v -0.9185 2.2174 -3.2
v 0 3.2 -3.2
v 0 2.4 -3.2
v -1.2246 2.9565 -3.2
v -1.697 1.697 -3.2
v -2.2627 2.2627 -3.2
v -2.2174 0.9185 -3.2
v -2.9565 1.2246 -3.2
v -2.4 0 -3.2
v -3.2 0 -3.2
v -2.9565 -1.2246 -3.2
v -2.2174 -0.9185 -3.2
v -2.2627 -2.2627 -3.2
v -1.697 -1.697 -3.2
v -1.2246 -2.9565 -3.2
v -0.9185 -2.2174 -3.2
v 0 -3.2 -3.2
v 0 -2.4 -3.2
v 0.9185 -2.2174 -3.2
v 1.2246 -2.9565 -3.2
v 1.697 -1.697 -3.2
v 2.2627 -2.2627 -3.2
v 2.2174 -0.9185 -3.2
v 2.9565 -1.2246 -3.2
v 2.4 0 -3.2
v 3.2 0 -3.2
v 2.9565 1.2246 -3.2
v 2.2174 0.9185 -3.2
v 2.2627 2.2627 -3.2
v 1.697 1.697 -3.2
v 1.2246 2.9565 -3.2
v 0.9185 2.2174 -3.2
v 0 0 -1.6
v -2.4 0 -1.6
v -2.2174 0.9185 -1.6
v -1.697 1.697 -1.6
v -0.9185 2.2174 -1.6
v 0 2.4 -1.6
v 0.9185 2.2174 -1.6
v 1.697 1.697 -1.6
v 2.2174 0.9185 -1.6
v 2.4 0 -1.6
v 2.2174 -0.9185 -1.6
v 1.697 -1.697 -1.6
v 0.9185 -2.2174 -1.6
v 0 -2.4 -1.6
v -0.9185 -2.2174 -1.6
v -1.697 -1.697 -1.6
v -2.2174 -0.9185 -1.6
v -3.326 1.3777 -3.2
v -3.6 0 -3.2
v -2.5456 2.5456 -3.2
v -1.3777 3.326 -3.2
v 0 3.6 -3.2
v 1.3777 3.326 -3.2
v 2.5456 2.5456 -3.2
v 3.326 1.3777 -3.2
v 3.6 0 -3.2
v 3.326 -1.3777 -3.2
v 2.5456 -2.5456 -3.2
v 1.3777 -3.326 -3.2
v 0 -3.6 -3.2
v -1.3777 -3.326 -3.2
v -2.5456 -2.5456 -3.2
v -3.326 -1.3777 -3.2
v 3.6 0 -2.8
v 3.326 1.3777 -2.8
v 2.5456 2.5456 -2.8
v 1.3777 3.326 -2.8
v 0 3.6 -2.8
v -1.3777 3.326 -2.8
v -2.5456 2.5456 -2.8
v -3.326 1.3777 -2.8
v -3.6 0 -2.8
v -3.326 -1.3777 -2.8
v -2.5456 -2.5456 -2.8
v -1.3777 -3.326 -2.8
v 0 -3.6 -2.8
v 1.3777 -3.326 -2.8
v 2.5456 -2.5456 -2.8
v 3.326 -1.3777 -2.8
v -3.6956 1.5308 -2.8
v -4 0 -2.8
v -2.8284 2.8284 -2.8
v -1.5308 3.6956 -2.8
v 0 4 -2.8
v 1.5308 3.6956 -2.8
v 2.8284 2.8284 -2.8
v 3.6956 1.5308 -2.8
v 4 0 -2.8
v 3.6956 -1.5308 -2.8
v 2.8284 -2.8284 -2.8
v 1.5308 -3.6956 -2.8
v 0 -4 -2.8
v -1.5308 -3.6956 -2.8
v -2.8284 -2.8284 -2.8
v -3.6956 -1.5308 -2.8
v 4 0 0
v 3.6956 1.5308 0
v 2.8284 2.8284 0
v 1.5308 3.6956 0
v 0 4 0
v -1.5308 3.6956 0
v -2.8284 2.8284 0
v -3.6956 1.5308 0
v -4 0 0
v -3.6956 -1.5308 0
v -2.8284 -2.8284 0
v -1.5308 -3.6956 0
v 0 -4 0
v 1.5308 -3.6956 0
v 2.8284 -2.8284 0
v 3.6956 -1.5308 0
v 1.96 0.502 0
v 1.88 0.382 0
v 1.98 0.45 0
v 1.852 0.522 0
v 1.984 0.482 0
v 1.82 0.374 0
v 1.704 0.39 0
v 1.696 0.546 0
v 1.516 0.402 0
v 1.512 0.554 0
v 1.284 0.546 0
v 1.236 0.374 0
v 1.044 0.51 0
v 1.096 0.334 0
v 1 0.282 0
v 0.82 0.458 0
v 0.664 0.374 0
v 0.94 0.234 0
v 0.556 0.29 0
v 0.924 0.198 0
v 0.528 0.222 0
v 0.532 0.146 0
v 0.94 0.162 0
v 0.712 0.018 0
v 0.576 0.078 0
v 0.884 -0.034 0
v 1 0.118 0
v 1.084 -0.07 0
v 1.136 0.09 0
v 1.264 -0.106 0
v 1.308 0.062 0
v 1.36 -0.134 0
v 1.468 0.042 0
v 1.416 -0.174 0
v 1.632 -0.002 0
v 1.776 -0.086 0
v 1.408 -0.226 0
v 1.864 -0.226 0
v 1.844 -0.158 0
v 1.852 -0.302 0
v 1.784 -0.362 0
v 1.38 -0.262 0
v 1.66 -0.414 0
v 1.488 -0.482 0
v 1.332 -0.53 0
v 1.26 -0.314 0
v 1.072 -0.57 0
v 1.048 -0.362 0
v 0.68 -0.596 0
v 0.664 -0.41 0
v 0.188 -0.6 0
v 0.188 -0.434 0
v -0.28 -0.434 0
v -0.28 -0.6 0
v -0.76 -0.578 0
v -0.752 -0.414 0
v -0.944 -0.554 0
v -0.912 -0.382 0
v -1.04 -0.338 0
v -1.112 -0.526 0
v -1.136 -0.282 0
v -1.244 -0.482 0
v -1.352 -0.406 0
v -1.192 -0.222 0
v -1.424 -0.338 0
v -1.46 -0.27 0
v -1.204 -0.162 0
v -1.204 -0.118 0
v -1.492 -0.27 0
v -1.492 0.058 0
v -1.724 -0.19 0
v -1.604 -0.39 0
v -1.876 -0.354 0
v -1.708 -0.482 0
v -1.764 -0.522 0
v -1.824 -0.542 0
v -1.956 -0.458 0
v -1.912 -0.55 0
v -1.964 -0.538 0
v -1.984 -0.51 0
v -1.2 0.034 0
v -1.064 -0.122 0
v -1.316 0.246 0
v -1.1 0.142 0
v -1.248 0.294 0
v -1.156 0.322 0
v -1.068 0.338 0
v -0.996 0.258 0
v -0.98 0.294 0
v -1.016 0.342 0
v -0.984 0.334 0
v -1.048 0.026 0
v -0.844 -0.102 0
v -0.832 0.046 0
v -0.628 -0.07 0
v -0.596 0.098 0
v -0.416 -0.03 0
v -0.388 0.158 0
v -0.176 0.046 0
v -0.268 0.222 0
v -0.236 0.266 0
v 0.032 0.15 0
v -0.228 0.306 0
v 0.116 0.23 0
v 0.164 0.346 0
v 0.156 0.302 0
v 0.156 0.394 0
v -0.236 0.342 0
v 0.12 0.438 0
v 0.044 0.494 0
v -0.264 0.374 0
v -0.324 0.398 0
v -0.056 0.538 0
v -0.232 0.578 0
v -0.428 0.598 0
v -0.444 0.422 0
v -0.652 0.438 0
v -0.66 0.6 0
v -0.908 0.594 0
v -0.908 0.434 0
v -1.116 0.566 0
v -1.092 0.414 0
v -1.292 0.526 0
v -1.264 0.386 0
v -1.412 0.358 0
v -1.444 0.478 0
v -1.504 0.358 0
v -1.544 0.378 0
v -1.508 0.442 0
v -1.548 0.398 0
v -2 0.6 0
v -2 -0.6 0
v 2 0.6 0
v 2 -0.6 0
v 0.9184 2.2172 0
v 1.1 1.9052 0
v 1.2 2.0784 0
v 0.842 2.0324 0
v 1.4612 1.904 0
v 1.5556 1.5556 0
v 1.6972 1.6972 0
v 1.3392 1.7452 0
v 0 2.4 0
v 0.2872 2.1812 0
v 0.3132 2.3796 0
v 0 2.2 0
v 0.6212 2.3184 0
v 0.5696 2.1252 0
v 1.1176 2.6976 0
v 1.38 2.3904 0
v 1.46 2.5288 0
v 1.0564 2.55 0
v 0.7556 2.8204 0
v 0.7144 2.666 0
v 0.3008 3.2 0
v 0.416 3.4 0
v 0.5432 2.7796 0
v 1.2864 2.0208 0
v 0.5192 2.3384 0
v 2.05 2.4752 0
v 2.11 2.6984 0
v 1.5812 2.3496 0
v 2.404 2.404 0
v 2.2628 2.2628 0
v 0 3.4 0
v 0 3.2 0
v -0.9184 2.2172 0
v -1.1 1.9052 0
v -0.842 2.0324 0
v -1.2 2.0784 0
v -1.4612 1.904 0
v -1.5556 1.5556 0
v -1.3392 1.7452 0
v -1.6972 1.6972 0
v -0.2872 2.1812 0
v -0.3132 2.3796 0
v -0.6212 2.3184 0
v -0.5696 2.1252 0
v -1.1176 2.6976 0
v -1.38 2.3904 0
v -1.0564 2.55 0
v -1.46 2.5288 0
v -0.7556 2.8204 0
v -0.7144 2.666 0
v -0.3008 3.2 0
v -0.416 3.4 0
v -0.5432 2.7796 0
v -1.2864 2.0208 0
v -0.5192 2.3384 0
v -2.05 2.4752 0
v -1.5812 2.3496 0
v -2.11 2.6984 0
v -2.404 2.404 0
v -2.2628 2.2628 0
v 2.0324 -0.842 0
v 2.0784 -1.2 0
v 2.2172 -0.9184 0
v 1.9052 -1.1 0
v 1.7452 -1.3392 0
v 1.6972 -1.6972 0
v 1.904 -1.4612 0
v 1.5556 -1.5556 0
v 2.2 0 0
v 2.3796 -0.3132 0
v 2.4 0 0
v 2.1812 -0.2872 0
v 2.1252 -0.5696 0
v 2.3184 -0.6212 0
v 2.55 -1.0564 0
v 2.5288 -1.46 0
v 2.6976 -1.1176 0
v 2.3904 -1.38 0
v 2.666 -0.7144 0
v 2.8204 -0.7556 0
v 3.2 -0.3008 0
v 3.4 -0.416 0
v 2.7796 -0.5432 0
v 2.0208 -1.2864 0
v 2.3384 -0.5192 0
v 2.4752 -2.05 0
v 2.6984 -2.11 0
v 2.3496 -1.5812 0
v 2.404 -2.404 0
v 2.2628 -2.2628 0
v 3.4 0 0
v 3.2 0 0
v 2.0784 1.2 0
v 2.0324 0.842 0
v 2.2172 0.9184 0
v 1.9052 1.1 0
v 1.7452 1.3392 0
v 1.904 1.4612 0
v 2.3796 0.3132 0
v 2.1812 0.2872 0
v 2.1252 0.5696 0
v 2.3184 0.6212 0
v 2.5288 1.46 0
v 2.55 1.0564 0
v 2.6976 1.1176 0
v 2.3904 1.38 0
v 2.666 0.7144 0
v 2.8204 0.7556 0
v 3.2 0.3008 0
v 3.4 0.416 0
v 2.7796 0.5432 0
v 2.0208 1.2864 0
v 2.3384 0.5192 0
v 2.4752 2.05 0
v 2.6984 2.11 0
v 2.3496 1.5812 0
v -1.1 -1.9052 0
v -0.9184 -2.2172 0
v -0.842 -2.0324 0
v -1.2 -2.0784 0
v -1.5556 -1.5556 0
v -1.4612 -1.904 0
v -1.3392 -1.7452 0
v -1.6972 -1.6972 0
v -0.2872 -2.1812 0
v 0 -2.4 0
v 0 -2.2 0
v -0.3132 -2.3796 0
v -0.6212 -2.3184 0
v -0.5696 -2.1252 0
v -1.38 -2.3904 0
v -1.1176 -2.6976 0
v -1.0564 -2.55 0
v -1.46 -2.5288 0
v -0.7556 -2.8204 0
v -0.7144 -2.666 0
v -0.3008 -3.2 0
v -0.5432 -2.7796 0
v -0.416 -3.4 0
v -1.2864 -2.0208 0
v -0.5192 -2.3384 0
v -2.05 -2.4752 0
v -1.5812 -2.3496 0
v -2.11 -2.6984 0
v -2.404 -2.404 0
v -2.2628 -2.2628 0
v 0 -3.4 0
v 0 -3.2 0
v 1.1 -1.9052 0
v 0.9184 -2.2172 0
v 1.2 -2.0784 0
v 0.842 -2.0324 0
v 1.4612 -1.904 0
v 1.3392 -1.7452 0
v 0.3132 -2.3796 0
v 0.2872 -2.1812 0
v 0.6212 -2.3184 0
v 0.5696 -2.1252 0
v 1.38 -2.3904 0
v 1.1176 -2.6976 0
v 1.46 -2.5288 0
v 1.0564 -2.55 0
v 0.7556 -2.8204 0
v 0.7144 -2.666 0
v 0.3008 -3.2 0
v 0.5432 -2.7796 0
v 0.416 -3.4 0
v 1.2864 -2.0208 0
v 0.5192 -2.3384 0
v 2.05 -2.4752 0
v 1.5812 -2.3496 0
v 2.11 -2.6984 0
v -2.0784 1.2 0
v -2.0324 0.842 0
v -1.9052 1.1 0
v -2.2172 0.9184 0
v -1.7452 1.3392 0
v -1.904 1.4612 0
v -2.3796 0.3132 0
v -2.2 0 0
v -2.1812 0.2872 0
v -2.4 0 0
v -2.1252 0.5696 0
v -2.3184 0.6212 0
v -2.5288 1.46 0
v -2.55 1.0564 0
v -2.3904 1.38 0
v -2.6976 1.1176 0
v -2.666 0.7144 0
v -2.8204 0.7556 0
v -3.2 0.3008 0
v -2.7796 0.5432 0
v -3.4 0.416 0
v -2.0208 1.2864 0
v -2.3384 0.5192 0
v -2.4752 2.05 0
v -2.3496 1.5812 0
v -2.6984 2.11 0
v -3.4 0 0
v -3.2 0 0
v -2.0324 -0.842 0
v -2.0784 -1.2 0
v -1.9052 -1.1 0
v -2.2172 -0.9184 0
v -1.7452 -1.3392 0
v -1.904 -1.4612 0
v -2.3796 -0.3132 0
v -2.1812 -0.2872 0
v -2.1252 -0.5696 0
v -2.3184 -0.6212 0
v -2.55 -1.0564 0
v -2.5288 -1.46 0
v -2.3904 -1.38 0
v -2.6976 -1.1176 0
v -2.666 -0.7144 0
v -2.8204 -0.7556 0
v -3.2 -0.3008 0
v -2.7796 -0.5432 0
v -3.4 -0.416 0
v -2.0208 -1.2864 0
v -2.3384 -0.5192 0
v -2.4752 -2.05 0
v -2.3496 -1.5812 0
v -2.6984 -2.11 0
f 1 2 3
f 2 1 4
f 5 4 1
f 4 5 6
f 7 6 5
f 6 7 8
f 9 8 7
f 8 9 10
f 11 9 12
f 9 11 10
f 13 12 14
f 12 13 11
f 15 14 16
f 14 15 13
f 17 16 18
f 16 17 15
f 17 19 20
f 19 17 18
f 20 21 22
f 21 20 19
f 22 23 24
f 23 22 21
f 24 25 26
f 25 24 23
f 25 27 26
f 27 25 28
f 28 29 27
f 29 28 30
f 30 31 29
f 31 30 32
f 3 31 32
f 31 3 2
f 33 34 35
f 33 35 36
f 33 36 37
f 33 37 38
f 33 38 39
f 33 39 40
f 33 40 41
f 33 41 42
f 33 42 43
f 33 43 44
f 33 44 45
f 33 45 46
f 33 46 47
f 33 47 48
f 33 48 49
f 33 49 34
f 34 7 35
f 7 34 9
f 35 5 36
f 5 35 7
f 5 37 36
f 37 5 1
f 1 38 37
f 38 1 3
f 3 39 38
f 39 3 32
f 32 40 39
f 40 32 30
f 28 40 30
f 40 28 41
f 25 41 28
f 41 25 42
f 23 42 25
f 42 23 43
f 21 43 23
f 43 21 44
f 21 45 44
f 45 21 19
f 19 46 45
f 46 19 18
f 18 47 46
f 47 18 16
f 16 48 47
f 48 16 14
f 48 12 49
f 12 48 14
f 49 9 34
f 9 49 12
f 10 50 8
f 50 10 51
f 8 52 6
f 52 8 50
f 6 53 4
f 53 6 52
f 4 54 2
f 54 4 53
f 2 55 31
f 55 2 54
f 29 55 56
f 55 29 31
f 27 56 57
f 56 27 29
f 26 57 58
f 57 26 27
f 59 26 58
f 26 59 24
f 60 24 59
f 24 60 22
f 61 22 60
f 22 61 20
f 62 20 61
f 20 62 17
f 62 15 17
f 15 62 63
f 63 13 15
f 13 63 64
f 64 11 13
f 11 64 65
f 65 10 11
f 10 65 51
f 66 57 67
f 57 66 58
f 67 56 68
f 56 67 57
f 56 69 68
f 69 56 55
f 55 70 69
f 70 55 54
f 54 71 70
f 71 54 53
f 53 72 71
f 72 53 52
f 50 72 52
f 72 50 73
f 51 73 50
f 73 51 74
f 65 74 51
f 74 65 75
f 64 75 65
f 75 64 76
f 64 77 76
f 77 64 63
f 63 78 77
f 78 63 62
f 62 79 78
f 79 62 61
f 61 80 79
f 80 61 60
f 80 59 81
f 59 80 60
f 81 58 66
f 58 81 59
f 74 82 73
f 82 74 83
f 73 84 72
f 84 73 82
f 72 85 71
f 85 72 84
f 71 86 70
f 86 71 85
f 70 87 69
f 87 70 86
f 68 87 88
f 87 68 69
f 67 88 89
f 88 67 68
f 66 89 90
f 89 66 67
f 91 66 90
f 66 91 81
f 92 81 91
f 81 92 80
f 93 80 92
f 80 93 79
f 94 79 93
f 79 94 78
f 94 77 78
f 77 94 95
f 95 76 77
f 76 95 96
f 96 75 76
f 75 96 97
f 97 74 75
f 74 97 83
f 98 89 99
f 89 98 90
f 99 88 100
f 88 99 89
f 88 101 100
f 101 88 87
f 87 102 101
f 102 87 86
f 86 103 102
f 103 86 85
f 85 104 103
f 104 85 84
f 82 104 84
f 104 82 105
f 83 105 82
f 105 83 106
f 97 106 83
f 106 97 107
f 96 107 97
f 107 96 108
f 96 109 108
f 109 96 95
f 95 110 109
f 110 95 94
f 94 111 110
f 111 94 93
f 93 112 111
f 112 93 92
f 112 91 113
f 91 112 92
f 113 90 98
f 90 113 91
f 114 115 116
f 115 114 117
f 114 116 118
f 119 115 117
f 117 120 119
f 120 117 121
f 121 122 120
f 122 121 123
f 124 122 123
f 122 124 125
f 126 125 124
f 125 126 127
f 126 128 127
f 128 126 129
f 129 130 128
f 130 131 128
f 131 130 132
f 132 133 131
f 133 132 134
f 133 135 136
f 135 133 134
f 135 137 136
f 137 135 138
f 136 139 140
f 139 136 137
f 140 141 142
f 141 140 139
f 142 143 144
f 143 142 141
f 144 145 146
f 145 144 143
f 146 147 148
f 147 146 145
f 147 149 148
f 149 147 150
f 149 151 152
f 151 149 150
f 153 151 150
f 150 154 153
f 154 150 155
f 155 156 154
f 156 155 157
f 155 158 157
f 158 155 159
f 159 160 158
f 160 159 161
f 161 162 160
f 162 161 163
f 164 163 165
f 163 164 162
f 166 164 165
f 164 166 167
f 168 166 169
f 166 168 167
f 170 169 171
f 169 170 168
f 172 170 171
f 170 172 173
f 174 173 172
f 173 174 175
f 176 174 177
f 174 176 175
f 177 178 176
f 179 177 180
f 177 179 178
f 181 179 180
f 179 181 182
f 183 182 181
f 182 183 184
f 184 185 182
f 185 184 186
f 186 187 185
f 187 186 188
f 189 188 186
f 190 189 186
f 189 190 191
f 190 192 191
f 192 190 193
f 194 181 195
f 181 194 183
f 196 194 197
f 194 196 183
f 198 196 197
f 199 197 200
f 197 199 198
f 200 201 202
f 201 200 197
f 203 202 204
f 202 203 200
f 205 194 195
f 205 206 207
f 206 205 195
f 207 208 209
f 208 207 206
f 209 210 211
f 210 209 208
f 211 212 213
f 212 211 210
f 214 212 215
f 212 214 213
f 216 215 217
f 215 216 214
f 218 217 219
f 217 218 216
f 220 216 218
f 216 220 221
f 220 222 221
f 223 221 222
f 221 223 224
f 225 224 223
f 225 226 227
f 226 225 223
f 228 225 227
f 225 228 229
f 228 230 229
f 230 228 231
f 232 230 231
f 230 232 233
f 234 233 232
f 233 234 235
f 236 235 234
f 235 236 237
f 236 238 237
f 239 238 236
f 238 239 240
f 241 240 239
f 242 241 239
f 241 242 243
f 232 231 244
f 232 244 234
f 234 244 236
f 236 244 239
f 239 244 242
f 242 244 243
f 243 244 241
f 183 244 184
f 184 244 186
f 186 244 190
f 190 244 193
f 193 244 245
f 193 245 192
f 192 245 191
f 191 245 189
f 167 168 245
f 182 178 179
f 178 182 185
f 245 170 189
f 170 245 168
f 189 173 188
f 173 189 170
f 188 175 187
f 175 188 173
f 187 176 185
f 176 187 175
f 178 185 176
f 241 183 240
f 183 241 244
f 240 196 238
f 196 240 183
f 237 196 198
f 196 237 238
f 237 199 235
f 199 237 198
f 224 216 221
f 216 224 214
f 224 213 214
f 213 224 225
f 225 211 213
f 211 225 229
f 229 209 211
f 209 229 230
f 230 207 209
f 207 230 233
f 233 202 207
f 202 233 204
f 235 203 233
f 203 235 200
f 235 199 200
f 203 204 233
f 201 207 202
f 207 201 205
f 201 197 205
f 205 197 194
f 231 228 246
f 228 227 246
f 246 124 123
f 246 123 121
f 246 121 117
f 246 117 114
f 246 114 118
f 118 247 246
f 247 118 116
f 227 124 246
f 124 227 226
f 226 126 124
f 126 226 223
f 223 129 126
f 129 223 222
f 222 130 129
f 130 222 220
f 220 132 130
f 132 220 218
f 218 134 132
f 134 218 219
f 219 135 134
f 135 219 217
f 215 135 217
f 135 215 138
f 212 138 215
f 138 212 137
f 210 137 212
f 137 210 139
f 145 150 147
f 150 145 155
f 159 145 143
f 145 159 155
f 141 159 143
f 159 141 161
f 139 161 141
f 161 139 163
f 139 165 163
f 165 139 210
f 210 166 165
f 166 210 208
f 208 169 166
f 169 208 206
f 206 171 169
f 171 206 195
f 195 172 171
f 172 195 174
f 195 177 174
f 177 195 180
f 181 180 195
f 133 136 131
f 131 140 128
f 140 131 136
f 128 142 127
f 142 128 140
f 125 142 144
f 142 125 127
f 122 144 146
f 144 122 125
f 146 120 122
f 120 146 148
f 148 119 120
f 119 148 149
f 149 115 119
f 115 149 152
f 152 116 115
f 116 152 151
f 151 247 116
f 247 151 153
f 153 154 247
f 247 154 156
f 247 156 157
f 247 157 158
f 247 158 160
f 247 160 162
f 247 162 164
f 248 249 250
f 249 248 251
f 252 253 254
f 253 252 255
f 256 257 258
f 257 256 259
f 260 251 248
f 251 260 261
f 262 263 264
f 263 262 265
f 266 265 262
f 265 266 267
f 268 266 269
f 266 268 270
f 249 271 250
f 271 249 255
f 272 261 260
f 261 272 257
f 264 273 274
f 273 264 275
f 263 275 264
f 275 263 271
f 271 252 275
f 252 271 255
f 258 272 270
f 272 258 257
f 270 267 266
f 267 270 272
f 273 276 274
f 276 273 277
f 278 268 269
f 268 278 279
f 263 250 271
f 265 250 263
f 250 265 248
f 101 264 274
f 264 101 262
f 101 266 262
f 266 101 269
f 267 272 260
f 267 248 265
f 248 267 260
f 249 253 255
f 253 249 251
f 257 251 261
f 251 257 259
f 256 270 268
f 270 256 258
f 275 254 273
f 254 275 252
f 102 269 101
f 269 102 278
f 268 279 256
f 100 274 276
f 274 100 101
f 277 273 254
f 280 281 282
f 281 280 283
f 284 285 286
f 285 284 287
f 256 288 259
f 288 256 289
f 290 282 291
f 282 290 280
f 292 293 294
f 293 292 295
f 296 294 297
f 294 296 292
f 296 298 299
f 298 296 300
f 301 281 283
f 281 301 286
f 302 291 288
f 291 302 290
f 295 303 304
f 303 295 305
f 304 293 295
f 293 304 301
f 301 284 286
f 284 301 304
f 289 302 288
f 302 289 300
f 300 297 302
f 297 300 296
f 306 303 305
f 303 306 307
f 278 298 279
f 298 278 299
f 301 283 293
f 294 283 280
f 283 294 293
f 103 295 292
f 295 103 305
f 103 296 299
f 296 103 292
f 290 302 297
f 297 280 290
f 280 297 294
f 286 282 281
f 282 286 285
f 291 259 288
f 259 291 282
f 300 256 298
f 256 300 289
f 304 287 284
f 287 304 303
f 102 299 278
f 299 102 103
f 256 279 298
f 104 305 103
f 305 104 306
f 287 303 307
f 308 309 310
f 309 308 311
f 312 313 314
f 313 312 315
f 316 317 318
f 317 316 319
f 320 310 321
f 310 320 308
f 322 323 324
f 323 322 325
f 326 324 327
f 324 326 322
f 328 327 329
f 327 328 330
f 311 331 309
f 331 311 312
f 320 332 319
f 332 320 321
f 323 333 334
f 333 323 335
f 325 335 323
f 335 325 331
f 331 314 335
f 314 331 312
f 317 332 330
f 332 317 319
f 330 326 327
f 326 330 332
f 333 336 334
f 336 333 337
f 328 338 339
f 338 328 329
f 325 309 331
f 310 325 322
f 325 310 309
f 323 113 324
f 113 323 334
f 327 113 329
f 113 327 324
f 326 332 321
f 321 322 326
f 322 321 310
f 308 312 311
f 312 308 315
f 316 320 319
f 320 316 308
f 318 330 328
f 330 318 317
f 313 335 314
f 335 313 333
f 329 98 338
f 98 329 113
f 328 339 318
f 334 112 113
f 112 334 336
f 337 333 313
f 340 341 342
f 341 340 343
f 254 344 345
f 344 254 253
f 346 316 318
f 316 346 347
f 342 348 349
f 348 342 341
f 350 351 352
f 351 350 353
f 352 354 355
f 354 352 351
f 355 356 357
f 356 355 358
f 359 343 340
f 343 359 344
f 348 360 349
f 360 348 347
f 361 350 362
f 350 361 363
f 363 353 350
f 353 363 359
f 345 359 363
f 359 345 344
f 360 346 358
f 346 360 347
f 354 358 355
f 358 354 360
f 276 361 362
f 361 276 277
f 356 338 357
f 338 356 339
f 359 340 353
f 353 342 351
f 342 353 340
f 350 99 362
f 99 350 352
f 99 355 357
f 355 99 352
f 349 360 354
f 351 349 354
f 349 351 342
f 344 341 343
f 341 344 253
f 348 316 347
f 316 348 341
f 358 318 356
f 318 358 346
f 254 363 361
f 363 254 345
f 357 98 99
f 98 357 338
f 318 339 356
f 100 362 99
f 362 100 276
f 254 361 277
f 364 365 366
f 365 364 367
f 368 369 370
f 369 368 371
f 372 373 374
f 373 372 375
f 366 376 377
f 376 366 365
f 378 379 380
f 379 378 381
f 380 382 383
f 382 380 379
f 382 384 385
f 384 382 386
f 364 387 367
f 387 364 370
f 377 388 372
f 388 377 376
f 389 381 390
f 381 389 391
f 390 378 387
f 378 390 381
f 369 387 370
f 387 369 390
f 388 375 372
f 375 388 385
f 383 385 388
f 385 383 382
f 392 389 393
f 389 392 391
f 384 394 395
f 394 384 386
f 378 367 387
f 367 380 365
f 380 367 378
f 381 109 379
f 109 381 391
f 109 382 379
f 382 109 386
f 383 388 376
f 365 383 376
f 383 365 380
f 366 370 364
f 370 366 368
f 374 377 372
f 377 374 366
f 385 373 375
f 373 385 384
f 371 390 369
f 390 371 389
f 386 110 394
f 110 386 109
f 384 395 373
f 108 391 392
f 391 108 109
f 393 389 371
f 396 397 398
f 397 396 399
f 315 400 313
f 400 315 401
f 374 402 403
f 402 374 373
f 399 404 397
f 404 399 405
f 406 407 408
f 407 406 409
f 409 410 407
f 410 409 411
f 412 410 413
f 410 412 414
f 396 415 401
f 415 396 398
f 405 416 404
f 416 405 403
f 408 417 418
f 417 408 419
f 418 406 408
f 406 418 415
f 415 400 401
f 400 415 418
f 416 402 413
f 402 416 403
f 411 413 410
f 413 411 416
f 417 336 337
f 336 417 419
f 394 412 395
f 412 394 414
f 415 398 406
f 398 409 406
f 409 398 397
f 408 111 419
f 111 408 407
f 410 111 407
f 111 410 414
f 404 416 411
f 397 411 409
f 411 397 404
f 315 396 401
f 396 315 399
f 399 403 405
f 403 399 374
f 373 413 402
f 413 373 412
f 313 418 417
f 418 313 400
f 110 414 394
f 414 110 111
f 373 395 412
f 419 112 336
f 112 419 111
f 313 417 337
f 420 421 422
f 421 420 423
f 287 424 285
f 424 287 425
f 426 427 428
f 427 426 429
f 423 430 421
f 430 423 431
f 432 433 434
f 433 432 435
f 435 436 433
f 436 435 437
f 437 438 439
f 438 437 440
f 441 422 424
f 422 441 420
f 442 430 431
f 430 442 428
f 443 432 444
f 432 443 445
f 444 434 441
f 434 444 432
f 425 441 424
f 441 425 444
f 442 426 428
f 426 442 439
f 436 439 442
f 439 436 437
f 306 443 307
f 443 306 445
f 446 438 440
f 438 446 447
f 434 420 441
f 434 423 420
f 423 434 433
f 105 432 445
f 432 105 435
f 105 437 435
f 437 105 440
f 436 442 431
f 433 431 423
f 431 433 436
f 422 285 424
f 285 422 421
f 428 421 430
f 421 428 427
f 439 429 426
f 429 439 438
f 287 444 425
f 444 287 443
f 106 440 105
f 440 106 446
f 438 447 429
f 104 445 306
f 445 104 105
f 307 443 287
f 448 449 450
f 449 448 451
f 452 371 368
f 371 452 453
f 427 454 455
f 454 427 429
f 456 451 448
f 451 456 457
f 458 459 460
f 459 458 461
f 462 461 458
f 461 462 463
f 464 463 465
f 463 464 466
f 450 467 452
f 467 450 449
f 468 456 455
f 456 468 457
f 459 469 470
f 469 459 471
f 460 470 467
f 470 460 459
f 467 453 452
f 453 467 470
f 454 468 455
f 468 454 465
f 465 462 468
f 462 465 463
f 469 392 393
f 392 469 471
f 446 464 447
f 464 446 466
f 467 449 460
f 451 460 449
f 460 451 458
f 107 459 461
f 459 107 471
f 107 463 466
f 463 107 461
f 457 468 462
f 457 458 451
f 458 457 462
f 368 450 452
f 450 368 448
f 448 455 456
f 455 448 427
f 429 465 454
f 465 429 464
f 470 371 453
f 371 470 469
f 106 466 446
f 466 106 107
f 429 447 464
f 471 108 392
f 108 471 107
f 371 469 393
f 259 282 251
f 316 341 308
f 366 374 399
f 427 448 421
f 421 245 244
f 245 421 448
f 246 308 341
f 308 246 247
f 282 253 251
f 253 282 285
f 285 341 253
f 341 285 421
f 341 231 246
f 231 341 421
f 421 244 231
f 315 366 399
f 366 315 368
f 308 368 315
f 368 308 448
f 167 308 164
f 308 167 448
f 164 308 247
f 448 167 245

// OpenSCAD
use <../lib.scad>
use <../p/4-4ering.scad>
use <../p/logo-porsche-rs-box.scad>
use <../p/logo-porsche-rs.scad>
use <s/98138pt0s01.scad>
use <s/98138s02.scad>
function ldraw_lib__98138pt0() = [
// 0 Tile  1 x  1 Round with "RS" Pattern
// 0 Name: 98138pt0.dat
// 0 Author: Gerald Lasser [GeraldLasser]
// 0 !LDRAW_ORG Part UPDATE 2026-01
// 0 !LICENSE Licensed under CC BY 4.0 : see CAreadme.txt
// 
// 0 BFC CERTIFY CCW
  [0,"BFC","CERTIFY"],
  [0,"BFC","CCW"],
// 
// 0 !KEYWORDS BrickLink 98138pb054, Brickowl 874657, Brickset 26505
// 0 !KEYWORDS Porsche GT3 RS, Rebrickable 98138pr0055, set 42056, Wheelhub
// 
// 0 !HISTORY 2017-12-30 [PTadmin] Official Update 2017-01
// 0 !HISTORY 2025-04-01 [jb70] Using new Logo Primitives and Subfile
// 0 !HISTORY 2025-06-26 [OrionP] Official Update 2025-06
// 0 !HISTORY 2025-12-23 [MagFors] Update description
// 0 !HISTORY 2025-12-25 [OrionP] Official Update 2025-12
// 0 !HISTORY 2026-01-29 [OrionP] Minor header edits
// 0 !HISTORY 2026-01-29 [OrionP] Official Update 2026-01
// 
// 1 16 0 0 0 1 0 0 0 1 0 0 0 1 s\98138s02.dat
  [1,16,0,0,0,1,0,0,0,1,0,0,0,1, ldraw_lib__s__98138s02()],
// 1 16 0 0 0 10 0 0 0 1 0 0 0 10 4-4ering.dat
  [1,16,0,0,0,10,0,0,0,1,0,0,0,10, ldraw_lib__4_4ering()],
// 1 15 0 0 0 .5 0 0 0 1 0 0 0 .5 logo-porsche-rs.dat
  [1,15,0,0,0,.5,0,0,0,1,0,0,0,.5, ldraw_lib__logo_porsche_rs()],
// 1 16 0 0 0 .5 0 0 0 1 0 0 0 .5 logo-porsche-rs-box.dat
  [1,16,0,0,0,.5,0,0,0,1,0,0,0,.5, ldraw_lib__logo_porsche_rs_box()],
// 1 16 0 0 0 1 0 0 0 1 0 0 0 1 s\98138pt0s01.dat
  [1,16,0,0,0,1,0,0,0,1,0,0,0,1, ldraw_lib__s__98138pt0s01()],
// 1 16 0 0 0 -1 0 0 0 1 0 0 0 1 s\98138pt0s01.dat
  [1,16,0,0,0,-1,0,0,0,1,0,0,0,1, ldraw_lib__s__98138pt0s01()],
// 1 16 0 0 0 0 0 1 0 1 0 -1 0 0 s\98138pt0s01.dat
  [1,16,0,0,0,0,0,1,0,1,0,-1,0,0, ldraw_lib__s__98138pt0s01()],
// 1 16 0 0 0 0 0 1 0 1 0 1 0 0 s\98138pt0s01.dat
  [1,16,0,0,0,0,0,1,0,1,0,1,0,0, ldraw_lib__s__98138pt0s01()],
// 1 16 0 0 0 -1 0 0 0 1 0 0 0 -1 s\98138pt0s01.dat
  [1,16,0,0,0,-1,0,0,0,1,0,0,0,-1, ldraw_lib__s__98138pt0s01()],
// 1 16 0 0 0 1 0 0 0 1 0 0 0 -1 s\98138pt0s01.dat
  [1,16,0,0,0,1,0,0,0,1,0,0,0,-1, ldraw_lib__s__98138pt0s01()],
// 1 16 0 0 0 0 0 -1 0 1 0 1 0 0 s\98138pt0s01.dat
  [1,16,0,0,0,0,0,-1,0,1,0,1,0,0, ldraw_lib__s__98138pt0s01()],
// 1 16 0 0 0 0 0 -1 0 1 0 -1 0 0 s\98138pt0s01.dat
  [1,16,0,0,0,0,0,-1,0,1,0,-1,0,0, ldraw_lib__s__98138pt0s01()],
// 3 16 0 0 5.5 -2.105 0 5.081 2.105 0 5.081
  [3,16,0,0,5.5,-2.105,0,5.081,2.105,0,5.081],
// 3 16 5.5 0 0 5.081 0 2.105 5.081 0 -2.105
  [3,16,5.5,0,0,5.081,0,2.105,5.081,0,-2.105],
// 3 16 -2.105 0 -5.081 0 0 -5.5 2.105 0 -5.081
  [3,16,-2.105,0,-5.081,0,0,-5.5,2.105,0,-5.081],
// 3 16 -5.5 0 0 -5.081 0 -2.105 -5.081 0 2.105
  [3,16,-5.5,0,0,-5.081,0,-2.105,-5.081,0,2.105],
// 4 16 -5 0 1.5 -5.081 0 2.105 -5.081 0 -2.105 -5 0 -1.5
  [4,16,-5,0,1.5,-5.081,0,2.105,-5.081,0,-2.105,-5,0,-1.5],
// 4 16 5.081 0 2.105 5 0 1.5 5 0 -1.5 5.081 0 -2.105
  [4,16,5.081,0,2.105,5,0,1.5,5,0,-1.5,5.081,0,-2.105],
// 4 16 2.105 0 5.081 -2.105 0 5.081 -3.889 0 3.889 3.889 0 3.889
  [4,16,2.105,0,5.081,-2.105,0,5.081,-3.889,0,3.889,3.889,0,3.889],
// 4 16 3.889 0 3.889 -3.889 0 3.889 -5.081 0 2.105 5.081 0 2.105
  [4,16,3.889,0,3.889,-3.889,0,3.889,-5.081,0,2.105,5.081,0,2.105],
// 4 16 5.081 0 2.105 -5.081 0 2.105 -1.65 0 1.5 5 0 1.5
  [4,16,5.081,0,2.105,-5.081,0,2.105,-1.65,0,1.5,5,0,1.5],
// 3 16 -5.081 0 2.105 -5 0 1.5 -1.65 0 1.5
  [3,16,-5.081,0,2.105,-5,0,1.5,-1.65,0,1.5],
// 4 16 -3.889 0 -3.889 -2.105 0 -5.081 2.105 0 -5.081 3.889 0 -3.889
  [4,16,-3.889,0,-3.889,-2.105,0,-5.081,2.105,0,-5.081,3.889,0,-3.889],
// 4 16 -5.081 0 -2.105 -3.889 0 -3.889 3.889 0 -3.889 5.081 0 -2.105
  [4,16,-5.081,0,-2.105,-3.889,0,-3.889,3.889,0,-3.889,5.081,0,-2.105],
// 4 16 -.7 0 -1.5 -5.081 0 -2.105 5.081 0 -2.105 .47 0 -1.5
  [4,16,-.7,0,-1.5,-5.081,0,-2.105,5.081,0,-2.105,.47,0,-1.5],
// 3 16 .47 0 -1.5 5.081 0 -2.105 5 0 -1.5
  [3,16,.47,0,-1.5,5.081,0,-2.105,5,0,-1.5],
// 3 16 -5.081 0 -2.105 -.7 0 -1.5 -5 0 -1.5
  [3,16,-5.081,0,-2.105,-.7,0,-1.5,-5,0,-1.5],
];
module ldraw_lib__98138pt0(step=0, col=false, unit=2/5, alt=false, line=0.2, solid=!$preview)
    makepoly(ldraw_lib__98138pt0(), step=step, col=col, unit=unit, alt=alt, line=line, solid=solid);
ldraw_lib__98138pt0(line=0.2);
